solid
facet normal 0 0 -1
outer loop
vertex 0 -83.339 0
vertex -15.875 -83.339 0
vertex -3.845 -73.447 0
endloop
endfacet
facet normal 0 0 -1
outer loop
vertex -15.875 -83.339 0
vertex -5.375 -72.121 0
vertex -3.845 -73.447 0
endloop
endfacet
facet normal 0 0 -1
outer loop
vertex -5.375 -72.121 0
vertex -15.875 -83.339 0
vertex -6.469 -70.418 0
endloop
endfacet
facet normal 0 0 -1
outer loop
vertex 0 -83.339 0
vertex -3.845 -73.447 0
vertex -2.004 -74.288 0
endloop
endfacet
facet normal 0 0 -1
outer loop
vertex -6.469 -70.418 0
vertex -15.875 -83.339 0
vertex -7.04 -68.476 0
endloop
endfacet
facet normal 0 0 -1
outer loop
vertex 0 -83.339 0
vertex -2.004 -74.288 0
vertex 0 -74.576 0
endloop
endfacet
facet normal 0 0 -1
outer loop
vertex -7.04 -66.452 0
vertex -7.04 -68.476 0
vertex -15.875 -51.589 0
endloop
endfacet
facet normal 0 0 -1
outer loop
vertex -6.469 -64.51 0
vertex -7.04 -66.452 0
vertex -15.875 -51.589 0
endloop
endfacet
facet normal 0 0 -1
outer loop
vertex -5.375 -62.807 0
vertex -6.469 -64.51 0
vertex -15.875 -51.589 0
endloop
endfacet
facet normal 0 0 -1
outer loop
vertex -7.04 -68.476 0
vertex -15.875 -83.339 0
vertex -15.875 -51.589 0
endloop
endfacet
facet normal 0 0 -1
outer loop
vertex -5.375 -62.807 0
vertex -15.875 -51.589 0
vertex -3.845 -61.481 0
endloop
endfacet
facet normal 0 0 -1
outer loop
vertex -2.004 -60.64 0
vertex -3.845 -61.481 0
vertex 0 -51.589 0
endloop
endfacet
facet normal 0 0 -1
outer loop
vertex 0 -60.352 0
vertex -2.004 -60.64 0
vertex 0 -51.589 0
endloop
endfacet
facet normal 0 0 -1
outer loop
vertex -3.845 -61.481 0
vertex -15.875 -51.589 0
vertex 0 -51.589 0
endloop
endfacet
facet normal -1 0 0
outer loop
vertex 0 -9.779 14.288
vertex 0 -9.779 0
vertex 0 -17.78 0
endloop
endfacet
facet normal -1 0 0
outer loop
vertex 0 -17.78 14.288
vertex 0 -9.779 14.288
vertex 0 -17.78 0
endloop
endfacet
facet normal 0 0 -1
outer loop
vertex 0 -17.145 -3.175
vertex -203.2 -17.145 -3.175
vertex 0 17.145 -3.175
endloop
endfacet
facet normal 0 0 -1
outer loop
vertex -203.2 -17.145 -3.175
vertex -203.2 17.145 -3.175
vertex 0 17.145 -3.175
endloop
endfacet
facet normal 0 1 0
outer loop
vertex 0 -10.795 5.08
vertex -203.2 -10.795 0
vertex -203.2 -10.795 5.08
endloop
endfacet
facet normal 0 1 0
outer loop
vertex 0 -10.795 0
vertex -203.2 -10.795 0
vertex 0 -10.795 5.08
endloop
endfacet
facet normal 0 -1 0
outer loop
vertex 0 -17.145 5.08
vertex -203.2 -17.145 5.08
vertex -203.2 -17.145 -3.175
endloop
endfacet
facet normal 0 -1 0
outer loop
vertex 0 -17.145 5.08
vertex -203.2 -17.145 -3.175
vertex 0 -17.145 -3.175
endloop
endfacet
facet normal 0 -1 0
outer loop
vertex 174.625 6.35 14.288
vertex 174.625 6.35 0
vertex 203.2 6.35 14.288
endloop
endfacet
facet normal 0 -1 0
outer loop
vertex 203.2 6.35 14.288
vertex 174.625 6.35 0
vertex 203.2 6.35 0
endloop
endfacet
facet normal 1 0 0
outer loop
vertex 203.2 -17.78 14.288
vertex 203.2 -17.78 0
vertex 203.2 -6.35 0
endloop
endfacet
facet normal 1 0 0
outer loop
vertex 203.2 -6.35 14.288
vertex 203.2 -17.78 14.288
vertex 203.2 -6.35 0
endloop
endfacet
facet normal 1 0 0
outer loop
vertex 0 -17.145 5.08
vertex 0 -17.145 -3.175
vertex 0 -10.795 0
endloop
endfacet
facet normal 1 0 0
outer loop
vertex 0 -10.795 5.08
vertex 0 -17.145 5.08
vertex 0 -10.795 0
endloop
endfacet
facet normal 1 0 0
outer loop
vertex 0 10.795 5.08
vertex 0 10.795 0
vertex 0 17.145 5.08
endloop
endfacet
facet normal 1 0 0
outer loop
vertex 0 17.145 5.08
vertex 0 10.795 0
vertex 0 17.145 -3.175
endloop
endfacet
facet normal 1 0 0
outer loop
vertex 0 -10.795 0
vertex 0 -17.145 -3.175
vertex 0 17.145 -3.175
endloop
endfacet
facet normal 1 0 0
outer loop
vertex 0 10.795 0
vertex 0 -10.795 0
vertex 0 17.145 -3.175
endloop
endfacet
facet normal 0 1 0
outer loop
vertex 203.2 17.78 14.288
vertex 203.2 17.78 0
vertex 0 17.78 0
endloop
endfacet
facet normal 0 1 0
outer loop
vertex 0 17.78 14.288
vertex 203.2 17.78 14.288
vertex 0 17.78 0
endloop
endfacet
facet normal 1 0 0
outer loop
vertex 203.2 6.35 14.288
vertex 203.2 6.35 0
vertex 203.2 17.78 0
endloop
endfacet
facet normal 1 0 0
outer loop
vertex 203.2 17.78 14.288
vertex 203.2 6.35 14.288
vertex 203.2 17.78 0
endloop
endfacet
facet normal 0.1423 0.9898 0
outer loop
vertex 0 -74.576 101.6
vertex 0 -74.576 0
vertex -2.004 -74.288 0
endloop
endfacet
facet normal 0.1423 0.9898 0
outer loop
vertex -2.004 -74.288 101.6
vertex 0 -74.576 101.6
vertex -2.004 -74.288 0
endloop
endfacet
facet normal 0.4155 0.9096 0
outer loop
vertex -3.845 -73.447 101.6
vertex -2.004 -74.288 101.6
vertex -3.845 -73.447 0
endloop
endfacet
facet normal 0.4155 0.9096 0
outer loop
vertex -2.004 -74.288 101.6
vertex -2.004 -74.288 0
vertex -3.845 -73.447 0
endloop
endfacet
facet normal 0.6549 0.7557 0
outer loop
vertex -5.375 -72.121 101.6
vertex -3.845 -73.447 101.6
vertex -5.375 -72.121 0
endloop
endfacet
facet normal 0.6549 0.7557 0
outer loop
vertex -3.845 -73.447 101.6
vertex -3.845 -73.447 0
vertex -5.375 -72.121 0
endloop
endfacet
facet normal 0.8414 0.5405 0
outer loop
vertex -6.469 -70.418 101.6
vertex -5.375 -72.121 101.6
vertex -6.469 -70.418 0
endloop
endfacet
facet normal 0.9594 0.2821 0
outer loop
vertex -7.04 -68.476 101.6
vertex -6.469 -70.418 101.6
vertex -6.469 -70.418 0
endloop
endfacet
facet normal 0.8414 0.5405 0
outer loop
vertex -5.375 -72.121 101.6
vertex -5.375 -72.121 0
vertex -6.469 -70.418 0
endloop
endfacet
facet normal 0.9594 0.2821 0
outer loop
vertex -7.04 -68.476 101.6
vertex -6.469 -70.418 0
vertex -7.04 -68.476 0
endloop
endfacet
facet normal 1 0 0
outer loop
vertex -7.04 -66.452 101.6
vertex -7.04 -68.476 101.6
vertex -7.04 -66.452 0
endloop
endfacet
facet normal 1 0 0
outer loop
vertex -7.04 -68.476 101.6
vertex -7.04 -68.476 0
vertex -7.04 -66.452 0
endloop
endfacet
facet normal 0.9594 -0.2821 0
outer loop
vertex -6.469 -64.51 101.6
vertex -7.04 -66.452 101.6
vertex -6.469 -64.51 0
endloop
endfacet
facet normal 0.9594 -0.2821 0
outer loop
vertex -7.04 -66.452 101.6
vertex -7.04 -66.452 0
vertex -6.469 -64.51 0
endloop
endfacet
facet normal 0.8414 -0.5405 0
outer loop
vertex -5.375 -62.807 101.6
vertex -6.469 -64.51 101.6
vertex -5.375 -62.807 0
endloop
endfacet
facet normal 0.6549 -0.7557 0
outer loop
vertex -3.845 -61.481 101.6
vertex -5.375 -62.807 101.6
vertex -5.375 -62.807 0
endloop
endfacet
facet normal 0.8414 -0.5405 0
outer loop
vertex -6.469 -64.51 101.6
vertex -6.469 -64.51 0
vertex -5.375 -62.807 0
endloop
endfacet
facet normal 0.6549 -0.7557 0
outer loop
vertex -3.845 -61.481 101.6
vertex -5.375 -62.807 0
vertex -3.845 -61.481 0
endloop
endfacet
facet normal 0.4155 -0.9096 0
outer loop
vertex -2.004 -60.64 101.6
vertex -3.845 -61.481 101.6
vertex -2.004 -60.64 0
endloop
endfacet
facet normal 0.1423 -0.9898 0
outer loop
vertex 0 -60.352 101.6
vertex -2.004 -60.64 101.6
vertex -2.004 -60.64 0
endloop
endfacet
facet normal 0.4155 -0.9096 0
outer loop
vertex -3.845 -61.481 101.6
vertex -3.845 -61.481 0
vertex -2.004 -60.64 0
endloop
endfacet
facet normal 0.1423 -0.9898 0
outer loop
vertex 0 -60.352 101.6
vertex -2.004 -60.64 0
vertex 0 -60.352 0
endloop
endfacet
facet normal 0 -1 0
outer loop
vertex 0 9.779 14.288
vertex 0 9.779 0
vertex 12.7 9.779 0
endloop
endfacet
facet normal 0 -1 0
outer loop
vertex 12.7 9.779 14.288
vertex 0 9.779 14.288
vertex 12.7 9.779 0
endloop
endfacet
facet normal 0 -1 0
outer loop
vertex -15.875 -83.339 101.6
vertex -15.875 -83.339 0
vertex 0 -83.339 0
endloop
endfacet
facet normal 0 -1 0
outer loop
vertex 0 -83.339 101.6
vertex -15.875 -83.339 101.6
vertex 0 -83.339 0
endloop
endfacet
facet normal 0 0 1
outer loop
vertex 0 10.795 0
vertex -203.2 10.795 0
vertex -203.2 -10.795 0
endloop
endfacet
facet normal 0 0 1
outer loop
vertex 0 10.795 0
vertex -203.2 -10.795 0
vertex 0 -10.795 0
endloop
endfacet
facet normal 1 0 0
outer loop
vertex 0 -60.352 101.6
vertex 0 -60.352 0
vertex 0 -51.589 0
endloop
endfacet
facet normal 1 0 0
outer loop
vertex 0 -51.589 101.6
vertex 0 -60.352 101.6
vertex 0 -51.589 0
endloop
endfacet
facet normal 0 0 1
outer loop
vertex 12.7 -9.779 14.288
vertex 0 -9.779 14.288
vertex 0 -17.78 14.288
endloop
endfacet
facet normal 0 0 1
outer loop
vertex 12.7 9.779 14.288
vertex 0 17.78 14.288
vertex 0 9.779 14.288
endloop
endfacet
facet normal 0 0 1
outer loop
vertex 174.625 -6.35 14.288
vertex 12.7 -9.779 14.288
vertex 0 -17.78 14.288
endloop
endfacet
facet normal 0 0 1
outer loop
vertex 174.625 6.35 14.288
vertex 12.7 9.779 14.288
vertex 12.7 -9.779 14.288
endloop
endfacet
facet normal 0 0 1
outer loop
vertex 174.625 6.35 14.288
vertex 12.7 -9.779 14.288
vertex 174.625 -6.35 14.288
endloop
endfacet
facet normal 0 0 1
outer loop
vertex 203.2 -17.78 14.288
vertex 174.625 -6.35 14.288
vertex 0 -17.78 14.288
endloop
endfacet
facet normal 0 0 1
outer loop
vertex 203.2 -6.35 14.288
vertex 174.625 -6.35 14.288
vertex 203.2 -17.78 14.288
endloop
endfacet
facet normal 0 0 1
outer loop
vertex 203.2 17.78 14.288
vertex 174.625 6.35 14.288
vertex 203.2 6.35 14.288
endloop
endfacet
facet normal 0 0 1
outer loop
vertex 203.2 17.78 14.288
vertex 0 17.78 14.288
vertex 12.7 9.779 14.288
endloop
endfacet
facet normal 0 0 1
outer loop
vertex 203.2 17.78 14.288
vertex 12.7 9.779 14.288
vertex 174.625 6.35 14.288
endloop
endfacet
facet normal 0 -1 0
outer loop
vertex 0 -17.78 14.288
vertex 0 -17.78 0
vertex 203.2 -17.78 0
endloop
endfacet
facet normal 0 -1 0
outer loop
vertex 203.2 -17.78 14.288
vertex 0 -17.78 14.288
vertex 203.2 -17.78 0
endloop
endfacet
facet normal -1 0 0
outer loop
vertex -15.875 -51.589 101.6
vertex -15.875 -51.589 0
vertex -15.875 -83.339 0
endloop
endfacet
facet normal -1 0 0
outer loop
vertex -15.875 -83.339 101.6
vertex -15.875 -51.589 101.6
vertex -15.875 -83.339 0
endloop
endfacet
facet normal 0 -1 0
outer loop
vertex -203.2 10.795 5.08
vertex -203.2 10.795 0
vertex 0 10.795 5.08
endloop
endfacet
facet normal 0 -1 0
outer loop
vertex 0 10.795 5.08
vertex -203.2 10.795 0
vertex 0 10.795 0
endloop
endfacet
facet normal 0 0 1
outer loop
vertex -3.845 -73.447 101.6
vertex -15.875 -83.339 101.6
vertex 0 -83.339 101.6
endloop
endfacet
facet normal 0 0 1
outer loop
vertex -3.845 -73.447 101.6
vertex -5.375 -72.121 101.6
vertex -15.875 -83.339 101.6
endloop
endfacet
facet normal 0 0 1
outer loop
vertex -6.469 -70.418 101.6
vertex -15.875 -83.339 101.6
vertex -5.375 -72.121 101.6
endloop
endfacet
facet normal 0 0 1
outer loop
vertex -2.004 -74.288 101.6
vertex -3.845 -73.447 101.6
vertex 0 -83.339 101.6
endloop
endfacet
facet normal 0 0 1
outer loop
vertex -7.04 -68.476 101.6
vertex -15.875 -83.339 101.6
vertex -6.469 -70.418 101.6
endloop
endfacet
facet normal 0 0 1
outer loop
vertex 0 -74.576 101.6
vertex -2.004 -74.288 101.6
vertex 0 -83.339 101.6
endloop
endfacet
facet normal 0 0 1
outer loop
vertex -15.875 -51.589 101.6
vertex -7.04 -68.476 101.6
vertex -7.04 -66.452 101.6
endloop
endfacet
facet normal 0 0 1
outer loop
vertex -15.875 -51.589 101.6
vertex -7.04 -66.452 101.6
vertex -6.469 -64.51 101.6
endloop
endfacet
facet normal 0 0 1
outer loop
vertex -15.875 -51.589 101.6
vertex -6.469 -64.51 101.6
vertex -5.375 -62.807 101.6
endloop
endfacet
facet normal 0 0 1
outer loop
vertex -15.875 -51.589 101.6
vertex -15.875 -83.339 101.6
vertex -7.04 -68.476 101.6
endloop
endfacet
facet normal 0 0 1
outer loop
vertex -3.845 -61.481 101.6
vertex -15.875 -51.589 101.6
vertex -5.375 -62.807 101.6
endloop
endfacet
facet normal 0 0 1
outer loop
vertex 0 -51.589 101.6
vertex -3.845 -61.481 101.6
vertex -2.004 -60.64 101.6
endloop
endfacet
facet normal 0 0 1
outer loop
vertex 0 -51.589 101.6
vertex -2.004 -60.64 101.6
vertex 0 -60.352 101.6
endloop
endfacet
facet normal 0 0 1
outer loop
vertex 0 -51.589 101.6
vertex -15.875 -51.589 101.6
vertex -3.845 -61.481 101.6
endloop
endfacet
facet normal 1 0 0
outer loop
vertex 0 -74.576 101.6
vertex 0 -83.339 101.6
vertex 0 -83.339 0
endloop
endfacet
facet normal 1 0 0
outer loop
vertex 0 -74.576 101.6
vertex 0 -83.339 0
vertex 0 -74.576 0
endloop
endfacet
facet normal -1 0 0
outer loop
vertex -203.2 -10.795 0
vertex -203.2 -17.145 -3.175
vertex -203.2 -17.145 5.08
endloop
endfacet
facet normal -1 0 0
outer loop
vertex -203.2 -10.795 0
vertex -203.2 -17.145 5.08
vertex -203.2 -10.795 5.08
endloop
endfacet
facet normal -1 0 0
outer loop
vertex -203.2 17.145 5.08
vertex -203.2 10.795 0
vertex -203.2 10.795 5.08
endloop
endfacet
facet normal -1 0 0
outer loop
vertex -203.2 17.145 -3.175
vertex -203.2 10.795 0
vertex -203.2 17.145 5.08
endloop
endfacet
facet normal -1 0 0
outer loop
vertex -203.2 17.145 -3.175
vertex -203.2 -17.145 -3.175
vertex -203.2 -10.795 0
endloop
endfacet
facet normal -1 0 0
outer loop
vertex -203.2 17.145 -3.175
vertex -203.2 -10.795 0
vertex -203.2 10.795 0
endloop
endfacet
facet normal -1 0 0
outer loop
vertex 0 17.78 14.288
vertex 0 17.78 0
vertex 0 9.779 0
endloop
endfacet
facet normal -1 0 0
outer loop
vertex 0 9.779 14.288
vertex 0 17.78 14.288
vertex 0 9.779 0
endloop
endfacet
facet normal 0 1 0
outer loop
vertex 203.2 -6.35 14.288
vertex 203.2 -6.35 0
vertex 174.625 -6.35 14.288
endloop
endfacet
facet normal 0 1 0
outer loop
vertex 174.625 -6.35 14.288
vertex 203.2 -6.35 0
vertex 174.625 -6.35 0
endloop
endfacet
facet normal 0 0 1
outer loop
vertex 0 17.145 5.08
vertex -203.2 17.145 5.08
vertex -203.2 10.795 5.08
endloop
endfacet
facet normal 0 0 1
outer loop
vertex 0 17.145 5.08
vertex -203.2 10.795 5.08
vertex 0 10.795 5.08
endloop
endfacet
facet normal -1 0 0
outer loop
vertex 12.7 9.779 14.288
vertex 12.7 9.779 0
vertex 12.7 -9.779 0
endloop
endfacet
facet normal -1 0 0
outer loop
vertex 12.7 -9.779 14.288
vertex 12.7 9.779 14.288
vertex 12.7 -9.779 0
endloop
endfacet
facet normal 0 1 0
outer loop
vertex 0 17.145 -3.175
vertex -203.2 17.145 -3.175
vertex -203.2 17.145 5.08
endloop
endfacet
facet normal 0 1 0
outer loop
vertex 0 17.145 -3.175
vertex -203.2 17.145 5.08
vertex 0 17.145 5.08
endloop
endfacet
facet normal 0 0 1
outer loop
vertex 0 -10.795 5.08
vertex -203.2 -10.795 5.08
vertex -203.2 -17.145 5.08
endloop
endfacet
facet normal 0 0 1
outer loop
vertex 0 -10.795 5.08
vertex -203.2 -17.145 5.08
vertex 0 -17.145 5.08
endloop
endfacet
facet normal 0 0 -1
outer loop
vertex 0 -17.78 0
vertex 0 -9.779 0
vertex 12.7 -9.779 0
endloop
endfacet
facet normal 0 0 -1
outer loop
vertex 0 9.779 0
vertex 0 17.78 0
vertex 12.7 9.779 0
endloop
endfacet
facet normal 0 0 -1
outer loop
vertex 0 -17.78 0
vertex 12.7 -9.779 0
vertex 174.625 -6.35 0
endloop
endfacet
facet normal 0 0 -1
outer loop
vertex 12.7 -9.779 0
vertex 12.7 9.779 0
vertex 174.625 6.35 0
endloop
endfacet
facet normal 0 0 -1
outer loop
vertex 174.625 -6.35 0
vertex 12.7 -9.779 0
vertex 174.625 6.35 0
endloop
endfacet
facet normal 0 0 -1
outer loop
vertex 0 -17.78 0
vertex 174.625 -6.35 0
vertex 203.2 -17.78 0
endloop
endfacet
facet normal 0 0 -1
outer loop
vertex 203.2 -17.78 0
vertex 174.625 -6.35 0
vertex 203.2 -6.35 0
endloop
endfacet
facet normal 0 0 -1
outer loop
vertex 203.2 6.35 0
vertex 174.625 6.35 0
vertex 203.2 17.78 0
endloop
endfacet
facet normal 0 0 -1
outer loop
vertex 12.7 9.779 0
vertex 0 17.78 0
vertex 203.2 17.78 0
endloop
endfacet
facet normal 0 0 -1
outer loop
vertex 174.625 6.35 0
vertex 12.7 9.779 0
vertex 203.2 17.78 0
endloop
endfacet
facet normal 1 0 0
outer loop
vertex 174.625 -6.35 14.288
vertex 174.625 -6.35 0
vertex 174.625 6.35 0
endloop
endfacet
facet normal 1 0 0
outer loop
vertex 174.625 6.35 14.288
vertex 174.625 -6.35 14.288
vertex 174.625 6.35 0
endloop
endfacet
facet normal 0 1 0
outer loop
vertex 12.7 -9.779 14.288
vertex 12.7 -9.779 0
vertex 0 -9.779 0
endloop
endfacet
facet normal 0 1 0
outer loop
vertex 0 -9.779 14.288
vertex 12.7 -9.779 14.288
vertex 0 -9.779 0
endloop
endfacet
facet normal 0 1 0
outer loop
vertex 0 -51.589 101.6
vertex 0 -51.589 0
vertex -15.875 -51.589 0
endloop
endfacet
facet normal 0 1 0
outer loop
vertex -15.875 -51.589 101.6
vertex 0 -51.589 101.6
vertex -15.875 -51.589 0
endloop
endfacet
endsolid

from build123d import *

# Parameters (mm, degrees)
F0_W     = 203.2
F0_H     = 6.35
F1_DEPTH = 3.175
F2_DEPTH = 5.08
F3_DEPTH = 14.2875
F4_DEPTH = 101.6


with BuildPart() as f1:
    # F0 (on Top) → F1 (new body)
    with BuildSketch(Plane.XY):
        with Locations((-101.6, -13.97)):
            Rectangle(F0_W, F0_H)
        Polygon((0, 10.795), (-203.2, 10.795), (-203.2, -10.795), (0, -10.795), (0, -9.779), (0, 9.779), align=None)
        with Locations((-101.6, 13.97)):
            Rectangle(F0_W, F0_H)
    extrude(amount=-F1_DEPTH)

    # F0 (on Top) → F2 (join)
    with BuildSketch(Plane.XY):
        with Locations((-101.6, 13.97)):
            Rectangle(F0_W, F0_H)
        with Locations((-101.6, -13.97)):
            Rectangle(F0_W, F0_H)
    extrude(amount=F2_DEPTH)


with BuildPart() as f3:
    # F0 (on Top) → F3 (new body)
    with BuildSketch(Plane.XY):
        Polygon((0, 17.145), (0, 10.795), (0, 9.779), (12.7, 9.779), (12.7, -9.779), (0, -9.779), (0, -10.795), (0, -17.145), (0, -17.78), (203.2, -17.78), (203.2, -6.35), (174.625, -6.35), (174.625, 6.35), (203.2, 6.35), (203.2, 17.78), (0, 17.78), align=None)
    extrude(amount=F3_DEPTH)


with BuildPart() as f4:
    # F0 (on Top) → F4 (new body)
    with BuildSketch(Plane.XY):
        with BuildLine():
            Line((0, -51.588938), (-15.875, -51.588938))
            Line((-15.875, -51.588938), (-15.875, -83.338938))
            Line((-15.875, -83.338938), (0, -83.338938))
            Line((0, -83.338938), (0, -74.575938))
            ThreePointArc((0, -74.575938), (-7.112, -67.463938), (0, -60.351938))
            Line((0, -60.351938), (0, -51.588938))
        make_face()
    extrude(amount=F4_DEPTH)


solid = Compound([f1.part, f3.part, f4.part])
